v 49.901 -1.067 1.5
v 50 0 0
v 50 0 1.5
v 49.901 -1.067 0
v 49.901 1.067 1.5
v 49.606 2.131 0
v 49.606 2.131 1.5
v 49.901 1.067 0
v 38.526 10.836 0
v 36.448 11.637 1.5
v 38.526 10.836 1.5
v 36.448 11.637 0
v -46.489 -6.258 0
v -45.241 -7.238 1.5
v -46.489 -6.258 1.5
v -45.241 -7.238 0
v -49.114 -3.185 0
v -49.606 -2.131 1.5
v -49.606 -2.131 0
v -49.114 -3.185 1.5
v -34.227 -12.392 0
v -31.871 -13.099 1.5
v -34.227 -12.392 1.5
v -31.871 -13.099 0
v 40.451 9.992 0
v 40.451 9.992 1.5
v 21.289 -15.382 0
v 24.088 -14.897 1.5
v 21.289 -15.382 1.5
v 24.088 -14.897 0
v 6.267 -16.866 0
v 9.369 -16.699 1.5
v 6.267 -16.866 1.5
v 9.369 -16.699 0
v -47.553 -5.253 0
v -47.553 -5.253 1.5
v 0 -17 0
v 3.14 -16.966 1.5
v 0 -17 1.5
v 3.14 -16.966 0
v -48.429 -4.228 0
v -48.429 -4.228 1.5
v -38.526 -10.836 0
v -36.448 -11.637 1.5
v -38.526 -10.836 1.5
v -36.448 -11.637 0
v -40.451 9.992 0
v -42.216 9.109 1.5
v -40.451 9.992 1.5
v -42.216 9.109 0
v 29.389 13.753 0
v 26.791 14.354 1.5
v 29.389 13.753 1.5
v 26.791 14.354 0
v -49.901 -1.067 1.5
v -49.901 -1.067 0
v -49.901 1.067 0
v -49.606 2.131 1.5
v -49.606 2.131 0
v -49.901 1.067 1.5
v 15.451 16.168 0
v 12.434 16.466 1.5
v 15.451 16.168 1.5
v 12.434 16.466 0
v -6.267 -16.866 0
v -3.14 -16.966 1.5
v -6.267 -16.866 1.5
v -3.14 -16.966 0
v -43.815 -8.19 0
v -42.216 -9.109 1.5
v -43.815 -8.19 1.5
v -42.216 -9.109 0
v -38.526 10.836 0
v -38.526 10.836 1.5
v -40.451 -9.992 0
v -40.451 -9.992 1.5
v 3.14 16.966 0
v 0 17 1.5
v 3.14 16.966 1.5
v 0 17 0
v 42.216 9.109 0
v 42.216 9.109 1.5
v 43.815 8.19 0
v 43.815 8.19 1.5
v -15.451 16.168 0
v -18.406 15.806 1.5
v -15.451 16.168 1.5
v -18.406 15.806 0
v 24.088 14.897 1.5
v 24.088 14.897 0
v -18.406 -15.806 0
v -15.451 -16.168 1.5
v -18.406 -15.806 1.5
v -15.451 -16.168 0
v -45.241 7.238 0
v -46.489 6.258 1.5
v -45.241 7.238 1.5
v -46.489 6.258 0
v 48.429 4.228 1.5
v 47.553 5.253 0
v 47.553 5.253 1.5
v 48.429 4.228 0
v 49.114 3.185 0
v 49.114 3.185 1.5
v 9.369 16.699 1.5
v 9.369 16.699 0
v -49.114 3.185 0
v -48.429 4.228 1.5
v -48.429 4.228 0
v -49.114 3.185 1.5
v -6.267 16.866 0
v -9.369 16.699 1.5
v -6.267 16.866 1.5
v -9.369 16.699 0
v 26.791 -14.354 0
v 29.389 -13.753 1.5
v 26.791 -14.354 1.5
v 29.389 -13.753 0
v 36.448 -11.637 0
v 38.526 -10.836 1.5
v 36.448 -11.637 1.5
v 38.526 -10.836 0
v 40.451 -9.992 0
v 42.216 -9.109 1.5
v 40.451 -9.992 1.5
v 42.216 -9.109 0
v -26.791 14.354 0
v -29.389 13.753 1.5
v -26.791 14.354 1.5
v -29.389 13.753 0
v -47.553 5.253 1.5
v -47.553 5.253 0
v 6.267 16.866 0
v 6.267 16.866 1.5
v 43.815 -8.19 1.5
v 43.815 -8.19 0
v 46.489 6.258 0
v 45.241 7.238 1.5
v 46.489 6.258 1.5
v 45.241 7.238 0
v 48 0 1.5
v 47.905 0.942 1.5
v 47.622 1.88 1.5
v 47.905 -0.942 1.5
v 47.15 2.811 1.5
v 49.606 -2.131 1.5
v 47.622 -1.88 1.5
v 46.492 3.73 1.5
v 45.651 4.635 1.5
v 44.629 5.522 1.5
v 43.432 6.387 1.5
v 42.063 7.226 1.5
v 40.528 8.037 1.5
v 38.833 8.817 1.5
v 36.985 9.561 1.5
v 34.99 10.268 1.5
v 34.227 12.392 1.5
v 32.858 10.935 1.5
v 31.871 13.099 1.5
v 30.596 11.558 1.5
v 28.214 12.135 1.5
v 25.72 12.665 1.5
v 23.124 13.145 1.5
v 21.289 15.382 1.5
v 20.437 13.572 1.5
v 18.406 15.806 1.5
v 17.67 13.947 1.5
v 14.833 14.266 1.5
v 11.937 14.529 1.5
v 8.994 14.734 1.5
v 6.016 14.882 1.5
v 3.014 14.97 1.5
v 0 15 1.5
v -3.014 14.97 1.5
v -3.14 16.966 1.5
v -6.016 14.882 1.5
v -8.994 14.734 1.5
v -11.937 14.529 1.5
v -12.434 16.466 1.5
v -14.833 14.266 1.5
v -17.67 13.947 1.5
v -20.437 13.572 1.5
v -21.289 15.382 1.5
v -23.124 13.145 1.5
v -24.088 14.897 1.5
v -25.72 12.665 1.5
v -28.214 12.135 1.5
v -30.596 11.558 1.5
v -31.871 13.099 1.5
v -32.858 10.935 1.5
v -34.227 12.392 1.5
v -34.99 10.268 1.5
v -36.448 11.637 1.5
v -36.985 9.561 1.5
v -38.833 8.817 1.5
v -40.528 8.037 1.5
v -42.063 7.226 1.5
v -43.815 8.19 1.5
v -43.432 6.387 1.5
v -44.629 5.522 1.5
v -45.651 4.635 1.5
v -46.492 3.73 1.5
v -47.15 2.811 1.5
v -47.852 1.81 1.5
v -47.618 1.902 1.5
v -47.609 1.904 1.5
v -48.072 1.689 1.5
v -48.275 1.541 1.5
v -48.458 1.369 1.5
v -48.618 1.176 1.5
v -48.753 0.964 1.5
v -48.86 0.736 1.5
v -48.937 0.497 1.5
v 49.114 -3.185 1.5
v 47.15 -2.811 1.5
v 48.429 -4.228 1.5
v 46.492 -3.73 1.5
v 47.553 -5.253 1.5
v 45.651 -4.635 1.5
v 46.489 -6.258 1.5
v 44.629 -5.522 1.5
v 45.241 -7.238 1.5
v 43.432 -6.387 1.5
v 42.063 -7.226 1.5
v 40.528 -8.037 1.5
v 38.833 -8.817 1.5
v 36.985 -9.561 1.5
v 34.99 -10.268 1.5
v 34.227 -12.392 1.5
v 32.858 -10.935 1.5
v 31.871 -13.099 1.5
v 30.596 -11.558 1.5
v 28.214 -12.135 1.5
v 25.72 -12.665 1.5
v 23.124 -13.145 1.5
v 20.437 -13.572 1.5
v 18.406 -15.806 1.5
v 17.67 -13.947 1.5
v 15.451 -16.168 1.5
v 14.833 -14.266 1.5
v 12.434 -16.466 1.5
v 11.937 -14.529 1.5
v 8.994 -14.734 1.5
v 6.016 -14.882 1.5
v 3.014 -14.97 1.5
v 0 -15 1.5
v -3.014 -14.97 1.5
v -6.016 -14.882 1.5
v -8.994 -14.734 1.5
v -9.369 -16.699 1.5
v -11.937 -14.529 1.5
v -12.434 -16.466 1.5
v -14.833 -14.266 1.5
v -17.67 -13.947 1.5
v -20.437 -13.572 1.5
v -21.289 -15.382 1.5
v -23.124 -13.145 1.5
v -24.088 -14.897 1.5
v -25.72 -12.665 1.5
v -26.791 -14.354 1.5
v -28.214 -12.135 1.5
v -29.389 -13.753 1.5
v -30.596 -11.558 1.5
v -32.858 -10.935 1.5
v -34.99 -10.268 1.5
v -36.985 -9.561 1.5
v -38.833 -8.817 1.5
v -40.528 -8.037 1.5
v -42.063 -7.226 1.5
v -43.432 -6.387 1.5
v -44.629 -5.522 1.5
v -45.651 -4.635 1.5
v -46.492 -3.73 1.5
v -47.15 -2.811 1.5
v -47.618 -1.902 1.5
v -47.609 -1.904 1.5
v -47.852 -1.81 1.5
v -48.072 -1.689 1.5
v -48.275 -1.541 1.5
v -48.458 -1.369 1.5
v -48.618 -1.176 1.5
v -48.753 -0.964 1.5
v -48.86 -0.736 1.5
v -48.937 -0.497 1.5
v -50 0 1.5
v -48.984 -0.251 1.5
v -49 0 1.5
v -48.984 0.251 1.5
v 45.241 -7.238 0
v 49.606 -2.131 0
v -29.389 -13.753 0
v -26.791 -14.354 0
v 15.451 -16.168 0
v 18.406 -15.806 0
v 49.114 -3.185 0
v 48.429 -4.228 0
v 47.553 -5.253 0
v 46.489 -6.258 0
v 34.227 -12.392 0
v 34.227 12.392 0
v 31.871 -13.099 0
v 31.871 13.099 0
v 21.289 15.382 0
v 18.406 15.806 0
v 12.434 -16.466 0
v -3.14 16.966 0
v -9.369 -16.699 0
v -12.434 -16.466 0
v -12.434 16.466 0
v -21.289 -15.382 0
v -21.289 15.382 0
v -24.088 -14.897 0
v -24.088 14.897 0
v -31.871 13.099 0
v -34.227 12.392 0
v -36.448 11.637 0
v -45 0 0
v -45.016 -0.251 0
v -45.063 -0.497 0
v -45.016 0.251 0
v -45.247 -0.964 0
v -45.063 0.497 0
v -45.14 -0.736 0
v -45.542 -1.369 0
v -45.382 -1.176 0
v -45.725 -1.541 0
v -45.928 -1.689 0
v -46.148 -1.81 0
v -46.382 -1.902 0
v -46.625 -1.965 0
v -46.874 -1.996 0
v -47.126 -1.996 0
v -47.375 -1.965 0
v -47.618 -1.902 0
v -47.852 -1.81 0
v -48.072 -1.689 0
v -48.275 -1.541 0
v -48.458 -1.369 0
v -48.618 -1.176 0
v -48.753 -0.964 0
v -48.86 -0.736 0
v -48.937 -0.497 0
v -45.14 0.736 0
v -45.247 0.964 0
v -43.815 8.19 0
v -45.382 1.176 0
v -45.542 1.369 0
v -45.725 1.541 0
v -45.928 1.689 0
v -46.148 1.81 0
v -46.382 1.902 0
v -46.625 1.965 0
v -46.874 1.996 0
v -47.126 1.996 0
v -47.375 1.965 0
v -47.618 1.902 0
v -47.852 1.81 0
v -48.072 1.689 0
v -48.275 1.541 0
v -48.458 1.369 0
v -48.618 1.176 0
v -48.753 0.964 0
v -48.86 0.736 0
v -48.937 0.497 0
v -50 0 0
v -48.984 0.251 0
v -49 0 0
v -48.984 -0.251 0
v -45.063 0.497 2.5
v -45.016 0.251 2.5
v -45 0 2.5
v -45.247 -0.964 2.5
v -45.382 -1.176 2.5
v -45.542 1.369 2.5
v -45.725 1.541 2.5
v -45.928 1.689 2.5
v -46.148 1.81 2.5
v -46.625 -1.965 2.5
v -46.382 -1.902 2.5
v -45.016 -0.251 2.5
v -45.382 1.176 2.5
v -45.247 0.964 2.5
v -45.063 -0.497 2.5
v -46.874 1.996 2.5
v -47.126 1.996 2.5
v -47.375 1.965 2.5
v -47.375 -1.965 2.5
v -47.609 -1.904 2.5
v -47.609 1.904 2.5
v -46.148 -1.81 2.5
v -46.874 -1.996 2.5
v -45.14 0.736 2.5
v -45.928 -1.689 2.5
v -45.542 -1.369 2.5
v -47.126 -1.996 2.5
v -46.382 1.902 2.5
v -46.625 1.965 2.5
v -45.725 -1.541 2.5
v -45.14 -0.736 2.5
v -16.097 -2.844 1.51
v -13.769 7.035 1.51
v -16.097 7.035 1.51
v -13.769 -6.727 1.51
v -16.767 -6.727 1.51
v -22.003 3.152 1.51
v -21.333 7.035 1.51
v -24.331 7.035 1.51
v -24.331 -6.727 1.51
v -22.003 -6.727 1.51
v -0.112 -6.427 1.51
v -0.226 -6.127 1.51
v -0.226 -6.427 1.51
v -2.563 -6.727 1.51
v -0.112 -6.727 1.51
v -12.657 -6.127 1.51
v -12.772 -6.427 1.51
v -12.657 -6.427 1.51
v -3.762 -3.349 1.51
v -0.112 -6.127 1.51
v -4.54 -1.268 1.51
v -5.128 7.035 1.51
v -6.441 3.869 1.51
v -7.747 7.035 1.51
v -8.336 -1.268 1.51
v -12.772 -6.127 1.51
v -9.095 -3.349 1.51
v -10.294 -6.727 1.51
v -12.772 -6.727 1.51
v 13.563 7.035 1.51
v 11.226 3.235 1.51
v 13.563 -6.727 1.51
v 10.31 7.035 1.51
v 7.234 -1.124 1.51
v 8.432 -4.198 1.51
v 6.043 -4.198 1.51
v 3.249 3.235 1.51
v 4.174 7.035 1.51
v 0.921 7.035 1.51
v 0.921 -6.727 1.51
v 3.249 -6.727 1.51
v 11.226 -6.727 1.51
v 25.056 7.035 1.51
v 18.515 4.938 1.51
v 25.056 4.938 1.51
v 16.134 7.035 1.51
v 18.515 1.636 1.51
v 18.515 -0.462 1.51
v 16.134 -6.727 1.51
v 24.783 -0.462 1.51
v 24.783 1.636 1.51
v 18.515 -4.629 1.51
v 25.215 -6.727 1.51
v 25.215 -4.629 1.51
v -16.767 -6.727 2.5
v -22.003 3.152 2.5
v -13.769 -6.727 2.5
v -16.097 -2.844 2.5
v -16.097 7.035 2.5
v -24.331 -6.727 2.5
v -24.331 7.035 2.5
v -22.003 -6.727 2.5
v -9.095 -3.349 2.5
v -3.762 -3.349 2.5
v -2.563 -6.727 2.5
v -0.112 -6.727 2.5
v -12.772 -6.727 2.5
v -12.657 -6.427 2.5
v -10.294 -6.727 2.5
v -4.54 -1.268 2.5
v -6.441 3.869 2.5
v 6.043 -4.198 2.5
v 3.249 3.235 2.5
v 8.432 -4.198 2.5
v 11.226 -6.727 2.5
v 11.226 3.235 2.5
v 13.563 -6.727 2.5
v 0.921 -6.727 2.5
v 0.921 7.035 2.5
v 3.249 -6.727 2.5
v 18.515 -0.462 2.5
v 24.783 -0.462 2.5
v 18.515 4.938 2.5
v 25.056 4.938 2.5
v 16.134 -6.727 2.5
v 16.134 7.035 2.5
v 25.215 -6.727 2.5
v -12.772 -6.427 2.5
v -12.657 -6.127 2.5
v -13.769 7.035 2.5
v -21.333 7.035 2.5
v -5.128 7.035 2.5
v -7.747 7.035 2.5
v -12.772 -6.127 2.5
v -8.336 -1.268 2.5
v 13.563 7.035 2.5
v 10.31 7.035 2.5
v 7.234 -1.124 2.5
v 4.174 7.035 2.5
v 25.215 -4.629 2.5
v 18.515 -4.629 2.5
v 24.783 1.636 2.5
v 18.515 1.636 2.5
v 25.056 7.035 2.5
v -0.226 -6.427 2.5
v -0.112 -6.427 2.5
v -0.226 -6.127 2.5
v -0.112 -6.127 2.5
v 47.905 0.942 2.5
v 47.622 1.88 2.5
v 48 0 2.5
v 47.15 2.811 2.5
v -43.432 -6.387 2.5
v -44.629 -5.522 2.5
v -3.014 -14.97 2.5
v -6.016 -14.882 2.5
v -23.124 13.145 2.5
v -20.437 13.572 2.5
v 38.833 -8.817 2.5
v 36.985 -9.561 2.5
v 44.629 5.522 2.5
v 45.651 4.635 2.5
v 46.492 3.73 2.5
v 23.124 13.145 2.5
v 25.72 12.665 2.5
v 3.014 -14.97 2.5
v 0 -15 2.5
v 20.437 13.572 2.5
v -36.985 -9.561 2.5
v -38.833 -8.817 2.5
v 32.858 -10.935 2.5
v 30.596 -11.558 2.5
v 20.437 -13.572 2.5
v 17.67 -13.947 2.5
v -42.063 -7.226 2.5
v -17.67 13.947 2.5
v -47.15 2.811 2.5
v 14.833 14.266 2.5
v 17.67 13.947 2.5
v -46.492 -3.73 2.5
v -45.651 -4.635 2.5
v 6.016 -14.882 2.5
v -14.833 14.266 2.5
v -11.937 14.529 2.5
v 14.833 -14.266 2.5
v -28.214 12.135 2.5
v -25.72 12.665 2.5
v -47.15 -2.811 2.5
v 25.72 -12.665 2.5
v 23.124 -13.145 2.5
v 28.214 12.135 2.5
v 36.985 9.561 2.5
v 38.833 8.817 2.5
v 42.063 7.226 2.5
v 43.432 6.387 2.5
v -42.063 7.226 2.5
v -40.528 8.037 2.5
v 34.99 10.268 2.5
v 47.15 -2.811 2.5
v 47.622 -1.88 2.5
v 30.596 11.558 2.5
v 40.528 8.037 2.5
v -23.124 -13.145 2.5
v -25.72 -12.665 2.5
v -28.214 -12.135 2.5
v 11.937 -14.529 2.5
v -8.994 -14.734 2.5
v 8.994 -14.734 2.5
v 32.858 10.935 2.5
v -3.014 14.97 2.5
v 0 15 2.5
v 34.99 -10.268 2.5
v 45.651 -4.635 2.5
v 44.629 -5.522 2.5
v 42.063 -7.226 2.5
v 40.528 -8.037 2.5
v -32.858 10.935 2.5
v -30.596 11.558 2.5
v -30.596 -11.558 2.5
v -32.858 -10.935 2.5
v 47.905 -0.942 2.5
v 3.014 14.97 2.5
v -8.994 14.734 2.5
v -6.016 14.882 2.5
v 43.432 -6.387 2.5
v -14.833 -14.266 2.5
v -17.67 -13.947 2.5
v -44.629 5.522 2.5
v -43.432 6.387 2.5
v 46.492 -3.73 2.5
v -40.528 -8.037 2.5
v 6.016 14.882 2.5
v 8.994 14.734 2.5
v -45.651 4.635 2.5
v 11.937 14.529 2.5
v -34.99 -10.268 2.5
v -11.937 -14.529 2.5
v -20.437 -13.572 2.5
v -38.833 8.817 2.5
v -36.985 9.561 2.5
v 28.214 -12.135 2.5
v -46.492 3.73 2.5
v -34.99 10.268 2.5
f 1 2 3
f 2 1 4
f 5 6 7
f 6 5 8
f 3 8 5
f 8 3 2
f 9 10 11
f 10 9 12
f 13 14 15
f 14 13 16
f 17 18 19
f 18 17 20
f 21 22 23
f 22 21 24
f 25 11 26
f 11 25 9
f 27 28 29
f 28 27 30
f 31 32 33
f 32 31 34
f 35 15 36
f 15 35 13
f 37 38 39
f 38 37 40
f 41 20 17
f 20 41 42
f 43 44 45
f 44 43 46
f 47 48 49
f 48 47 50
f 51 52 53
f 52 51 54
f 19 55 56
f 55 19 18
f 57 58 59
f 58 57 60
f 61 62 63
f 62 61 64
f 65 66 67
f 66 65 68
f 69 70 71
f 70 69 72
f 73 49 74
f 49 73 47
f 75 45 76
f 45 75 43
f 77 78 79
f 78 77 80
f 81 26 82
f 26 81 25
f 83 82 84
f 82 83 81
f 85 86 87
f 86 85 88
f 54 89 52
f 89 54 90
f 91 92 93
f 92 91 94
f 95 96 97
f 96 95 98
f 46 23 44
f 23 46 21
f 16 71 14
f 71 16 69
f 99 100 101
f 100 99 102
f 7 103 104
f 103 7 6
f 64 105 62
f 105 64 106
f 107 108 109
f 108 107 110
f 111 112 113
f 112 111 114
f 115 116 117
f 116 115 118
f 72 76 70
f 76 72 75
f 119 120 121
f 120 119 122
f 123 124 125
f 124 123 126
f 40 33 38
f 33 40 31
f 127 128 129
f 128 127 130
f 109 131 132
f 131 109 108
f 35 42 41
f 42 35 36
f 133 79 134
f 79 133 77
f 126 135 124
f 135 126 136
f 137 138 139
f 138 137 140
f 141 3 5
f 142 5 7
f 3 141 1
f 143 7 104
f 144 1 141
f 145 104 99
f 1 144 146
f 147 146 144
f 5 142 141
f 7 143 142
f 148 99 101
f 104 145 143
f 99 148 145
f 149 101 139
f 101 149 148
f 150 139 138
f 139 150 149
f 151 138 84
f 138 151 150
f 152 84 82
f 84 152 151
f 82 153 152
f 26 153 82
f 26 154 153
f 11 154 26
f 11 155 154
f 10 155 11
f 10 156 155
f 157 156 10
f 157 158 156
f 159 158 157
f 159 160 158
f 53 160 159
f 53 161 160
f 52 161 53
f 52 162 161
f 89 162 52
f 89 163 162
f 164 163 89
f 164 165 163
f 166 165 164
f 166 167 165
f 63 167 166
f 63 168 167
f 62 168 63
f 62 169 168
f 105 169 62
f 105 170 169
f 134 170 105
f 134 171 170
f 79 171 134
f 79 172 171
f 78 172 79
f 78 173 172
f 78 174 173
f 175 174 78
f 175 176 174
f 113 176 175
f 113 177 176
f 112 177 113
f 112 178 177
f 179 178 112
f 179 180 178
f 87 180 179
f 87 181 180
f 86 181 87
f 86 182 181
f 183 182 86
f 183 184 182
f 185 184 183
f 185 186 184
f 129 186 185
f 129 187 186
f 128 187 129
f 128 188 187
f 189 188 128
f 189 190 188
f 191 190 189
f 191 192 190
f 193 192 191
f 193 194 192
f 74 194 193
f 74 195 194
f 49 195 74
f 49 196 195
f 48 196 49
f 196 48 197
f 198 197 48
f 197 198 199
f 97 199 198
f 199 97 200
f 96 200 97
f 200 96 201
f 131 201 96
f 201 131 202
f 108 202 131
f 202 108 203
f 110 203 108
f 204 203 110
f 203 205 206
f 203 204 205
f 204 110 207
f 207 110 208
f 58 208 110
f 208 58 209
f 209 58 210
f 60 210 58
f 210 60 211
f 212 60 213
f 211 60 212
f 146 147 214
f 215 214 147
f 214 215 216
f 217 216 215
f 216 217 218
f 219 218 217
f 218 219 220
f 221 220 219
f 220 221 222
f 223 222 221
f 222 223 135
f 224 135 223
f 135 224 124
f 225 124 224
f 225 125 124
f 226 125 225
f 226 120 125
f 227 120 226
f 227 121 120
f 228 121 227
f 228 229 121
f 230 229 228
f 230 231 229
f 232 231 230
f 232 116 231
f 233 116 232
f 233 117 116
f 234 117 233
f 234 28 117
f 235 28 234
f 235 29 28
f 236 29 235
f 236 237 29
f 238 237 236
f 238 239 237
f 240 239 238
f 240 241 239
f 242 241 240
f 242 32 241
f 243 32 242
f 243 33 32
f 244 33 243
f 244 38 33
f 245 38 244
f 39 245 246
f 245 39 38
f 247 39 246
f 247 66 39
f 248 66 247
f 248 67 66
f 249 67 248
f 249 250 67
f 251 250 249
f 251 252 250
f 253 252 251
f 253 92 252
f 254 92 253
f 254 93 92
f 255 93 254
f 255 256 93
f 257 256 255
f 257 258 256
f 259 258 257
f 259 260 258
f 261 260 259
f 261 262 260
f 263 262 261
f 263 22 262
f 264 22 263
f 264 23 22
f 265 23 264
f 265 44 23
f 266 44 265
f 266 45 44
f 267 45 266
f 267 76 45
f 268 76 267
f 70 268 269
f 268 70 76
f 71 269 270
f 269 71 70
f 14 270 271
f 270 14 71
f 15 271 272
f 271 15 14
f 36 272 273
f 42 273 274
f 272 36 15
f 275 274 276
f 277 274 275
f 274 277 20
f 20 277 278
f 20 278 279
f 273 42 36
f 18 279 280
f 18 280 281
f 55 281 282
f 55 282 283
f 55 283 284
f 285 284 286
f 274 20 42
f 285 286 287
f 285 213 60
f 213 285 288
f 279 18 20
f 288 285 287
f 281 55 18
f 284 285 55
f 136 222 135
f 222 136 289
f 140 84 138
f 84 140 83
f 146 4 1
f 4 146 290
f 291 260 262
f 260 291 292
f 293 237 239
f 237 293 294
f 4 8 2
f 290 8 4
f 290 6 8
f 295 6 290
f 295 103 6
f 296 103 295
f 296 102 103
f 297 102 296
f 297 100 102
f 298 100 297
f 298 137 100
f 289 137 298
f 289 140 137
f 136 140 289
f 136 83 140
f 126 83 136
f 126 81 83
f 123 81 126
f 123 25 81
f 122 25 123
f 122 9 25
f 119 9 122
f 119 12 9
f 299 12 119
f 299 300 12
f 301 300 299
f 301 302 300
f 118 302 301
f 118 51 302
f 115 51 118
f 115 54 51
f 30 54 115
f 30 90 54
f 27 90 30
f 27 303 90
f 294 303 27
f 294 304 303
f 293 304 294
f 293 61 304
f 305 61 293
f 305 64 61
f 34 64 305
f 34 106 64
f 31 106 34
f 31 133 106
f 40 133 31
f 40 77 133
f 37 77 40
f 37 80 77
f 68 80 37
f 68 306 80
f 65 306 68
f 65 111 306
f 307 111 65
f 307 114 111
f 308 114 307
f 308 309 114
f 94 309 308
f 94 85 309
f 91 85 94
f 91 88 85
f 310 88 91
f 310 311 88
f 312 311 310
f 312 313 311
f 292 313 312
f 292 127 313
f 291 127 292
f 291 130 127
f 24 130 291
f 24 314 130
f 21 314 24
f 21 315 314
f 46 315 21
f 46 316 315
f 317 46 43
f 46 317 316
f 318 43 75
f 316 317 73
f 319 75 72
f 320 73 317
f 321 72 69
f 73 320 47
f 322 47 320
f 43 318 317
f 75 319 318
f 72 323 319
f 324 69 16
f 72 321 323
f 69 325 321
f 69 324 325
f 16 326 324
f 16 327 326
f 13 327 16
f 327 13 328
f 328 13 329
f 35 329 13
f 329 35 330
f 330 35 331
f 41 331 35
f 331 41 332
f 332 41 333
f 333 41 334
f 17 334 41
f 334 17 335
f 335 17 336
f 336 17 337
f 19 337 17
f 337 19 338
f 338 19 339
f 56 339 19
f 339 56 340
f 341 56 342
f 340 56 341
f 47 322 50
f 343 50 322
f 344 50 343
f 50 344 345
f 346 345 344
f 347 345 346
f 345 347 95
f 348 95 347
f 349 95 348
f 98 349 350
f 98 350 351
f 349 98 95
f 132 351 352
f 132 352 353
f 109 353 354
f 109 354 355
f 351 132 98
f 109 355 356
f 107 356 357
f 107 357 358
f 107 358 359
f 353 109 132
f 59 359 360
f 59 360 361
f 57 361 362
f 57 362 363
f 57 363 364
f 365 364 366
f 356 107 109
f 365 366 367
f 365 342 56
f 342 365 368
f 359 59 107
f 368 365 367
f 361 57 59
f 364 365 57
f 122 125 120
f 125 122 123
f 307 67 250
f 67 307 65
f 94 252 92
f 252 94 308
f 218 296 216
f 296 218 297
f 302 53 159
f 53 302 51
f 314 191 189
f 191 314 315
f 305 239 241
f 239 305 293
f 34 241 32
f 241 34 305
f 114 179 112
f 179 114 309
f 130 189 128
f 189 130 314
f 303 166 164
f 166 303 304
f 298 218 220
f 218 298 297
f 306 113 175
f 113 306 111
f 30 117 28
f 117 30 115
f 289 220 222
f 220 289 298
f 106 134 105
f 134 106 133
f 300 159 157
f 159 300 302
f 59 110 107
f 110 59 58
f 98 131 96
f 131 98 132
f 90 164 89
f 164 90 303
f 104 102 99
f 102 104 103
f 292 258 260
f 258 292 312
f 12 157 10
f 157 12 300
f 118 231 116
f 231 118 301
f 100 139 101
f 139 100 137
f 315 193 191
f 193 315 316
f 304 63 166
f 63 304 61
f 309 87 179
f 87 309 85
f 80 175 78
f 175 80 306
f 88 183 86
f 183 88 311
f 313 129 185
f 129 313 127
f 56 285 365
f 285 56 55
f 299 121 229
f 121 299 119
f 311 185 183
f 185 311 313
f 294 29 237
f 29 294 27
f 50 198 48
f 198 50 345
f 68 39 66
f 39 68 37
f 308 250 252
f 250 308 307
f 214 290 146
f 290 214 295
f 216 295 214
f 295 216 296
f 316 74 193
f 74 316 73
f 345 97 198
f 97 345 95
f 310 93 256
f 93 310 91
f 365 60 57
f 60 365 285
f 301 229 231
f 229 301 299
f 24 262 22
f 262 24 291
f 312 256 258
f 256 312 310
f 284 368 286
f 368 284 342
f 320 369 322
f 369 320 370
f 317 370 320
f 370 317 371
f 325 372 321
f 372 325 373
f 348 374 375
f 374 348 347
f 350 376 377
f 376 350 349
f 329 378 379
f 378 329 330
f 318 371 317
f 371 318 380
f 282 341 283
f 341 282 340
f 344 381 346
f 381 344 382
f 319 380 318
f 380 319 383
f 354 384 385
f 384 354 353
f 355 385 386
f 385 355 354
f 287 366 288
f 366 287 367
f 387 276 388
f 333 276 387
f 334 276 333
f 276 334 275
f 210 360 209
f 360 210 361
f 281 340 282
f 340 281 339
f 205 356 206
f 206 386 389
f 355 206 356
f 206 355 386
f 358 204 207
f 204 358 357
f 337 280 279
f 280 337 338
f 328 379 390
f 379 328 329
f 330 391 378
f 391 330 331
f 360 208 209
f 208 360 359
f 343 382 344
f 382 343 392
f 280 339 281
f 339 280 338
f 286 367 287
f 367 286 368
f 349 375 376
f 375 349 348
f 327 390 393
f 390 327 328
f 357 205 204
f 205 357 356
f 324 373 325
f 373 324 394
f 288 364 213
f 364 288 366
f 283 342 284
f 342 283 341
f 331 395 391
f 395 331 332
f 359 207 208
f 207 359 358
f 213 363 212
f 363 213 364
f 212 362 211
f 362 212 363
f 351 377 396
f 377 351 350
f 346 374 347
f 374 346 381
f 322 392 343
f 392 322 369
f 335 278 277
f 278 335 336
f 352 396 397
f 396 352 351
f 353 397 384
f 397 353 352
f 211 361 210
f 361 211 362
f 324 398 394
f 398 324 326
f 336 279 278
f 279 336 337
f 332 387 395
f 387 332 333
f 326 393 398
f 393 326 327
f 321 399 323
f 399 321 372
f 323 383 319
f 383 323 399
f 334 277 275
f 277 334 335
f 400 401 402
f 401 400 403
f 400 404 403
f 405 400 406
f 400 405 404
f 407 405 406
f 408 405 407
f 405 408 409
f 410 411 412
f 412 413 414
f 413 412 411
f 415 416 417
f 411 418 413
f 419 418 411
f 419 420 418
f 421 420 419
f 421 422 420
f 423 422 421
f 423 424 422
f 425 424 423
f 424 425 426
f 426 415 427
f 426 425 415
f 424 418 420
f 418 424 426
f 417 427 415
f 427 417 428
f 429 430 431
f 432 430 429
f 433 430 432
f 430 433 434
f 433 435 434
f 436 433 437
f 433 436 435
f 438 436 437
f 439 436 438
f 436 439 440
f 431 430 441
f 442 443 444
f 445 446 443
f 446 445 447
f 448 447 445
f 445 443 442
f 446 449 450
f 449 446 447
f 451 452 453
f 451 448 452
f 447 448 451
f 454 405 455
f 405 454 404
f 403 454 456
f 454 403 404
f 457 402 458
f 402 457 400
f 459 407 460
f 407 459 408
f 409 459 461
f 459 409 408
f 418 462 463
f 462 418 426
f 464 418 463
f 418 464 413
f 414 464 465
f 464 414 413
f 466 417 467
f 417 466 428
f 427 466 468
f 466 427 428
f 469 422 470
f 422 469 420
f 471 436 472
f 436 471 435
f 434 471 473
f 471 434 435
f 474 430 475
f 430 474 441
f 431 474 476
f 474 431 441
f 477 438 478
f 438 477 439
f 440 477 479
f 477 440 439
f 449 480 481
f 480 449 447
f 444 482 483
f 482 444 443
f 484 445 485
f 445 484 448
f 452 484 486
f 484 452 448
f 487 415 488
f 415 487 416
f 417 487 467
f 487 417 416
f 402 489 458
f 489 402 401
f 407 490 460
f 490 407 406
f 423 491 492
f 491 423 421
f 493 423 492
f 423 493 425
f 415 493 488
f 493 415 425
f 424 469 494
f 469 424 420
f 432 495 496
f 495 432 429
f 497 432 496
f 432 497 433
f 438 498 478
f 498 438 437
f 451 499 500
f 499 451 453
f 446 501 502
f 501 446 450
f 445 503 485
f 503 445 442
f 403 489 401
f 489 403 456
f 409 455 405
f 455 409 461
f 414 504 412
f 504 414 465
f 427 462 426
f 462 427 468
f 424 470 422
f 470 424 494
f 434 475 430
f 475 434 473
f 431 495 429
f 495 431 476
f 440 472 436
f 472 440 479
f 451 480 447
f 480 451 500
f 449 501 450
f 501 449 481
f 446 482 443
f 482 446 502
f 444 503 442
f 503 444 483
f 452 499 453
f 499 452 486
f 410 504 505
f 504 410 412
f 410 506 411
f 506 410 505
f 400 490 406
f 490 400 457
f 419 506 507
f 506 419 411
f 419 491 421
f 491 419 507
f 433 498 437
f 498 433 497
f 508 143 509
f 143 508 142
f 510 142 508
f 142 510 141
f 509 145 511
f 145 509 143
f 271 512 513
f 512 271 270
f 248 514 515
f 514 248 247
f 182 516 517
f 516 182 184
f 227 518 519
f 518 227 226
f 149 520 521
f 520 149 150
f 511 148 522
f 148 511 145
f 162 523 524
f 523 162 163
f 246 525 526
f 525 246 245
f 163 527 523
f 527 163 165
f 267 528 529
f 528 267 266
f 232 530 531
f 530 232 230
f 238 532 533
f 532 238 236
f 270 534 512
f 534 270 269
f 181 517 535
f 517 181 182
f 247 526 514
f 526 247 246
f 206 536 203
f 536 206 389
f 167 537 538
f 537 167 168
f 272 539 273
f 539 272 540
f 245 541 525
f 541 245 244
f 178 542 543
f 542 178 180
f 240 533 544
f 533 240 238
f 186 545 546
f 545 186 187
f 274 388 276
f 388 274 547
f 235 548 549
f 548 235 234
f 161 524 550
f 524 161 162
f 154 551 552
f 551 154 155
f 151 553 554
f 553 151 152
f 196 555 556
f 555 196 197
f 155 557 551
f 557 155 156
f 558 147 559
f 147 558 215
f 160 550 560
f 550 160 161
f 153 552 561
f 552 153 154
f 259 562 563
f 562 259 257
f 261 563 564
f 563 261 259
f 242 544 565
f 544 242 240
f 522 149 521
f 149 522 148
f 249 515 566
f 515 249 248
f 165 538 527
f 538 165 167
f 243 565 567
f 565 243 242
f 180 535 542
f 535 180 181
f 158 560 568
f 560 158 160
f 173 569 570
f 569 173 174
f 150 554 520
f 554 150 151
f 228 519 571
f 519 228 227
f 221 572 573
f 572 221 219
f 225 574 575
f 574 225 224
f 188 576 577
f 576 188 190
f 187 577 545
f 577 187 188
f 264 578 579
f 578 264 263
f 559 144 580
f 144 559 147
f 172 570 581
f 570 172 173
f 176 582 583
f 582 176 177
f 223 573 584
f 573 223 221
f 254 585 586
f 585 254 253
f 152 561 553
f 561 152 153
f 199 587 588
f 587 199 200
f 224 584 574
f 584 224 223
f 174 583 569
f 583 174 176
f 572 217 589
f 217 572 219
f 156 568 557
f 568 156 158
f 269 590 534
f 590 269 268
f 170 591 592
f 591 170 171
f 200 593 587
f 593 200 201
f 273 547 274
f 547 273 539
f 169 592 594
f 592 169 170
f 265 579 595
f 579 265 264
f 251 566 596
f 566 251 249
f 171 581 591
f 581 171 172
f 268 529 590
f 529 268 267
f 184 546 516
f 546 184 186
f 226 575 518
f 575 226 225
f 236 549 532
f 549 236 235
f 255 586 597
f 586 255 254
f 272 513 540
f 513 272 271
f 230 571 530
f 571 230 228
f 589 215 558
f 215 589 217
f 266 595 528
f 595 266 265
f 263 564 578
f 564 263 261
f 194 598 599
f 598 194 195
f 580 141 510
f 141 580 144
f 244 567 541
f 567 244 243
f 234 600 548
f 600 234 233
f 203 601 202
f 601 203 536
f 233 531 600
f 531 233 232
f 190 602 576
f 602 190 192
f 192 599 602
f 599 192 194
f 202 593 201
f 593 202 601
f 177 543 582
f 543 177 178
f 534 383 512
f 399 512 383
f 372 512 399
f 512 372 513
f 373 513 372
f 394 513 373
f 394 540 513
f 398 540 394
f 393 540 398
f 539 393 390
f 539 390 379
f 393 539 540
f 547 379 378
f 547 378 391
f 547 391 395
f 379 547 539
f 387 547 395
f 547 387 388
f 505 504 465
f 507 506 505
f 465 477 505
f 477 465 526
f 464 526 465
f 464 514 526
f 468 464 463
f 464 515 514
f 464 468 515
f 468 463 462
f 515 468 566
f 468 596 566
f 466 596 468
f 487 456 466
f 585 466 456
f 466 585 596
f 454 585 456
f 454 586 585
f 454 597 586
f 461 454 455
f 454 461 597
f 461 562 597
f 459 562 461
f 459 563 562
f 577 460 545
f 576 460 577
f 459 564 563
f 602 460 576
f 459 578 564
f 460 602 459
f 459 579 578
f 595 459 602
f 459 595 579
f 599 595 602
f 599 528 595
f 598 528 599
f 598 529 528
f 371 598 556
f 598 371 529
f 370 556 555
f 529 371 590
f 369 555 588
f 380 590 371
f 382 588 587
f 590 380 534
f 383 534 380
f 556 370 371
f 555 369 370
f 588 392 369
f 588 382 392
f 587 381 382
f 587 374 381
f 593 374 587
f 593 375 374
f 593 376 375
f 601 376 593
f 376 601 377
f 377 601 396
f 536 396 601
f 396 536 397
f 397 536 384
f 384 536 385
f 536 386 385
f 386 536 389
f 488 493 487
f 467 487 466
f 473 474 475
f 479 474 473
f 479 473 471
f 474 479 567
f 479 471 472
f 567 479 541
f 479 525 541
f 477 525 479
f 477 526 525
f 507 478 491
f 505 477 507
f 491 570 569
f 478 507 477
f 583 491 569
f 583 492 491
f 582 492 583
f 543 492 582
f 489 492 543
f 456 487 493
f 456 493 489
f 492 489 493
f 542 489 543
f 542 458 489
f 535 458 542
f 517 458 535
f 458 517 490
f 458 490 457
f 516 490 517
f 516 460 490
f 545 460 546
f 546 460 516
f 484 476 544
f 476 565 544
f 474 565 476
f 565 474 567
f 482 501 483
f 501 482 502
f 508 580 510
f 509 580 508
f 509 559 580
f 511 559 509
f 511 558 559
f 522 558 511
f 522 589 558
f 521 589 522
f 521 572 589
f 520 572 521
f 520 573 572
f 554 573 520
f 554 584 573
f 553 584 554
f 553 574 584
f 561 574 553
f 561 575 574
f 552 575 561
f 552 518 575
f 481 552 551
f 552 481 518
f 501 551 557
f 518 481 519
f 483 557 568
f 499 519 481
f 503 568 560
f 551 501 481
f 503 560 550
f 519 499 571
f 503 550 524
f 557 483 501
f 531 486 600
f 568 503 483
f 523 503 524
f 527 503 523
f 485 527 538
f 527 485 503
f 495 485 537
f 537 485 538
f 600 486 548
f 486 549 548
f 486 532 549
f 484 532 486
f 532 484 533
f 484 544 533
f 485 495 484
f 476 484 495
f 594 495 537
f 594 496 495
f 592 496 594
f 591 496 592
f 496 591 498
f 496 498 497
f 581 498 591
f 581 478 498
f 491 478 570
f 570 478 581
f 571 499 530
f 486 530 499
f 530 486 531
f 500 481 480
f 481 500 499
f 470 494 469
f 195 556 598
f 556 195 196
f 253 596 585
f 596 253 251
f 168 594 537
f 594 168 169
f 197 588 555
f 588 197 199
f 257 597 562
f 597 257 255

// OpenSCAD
// Two-Layer Oval Zipper Pull Template with Engraved Text
// Creates a white base oval with a blue top oval, engraved text, and a hole for zipper attachment

// Parameters - these can be overridden from command line
name = "NAME"; // Text to display on zipper pull
oval_width = 96; // Width of blue oval (mm) - white base will be 100mm total (96 + 2*2)
oval_height = 30; // Height of blue oval (mm) - white base will be 34mm total (30 + 2*2)
base_thickness = 1.5; // Thickness of white base layer (mm)
top_thickness = 1; // Thickness of blue top layer (mm)
base_offset = 2; // How much larger the white base is (mm)
base_text_size = 13; // Base font size for medium names (reduced to prevent interference with hole)
text_depth = 1; // How deep the text is engraved (mm) - cuts through blue to show white
font_file = "C:/Users/Fred/claude/Fordscript.ttf"; // Path to the custom font file

// Dynamic font sizing based on name length (mimics Ford oval proportions)
// "Fred" (4 chars) at 13mm gives ~20% coverage - our target
name_length = len(name);
text_size = name_length <= 3 ? 18 :      // Short names (Zoe, Sam, Al) - larger
            name_length <= 5 ? 13 :      // Medium names (Fred, John, Mary) - standard
            name_length <= 8 ? 11 :      // Longer names (Michael, Jessica) - smaller
            9;                           // Very long names (Christopher) - smallest

// Hole parameters for zipper pull
hole_diameter = 4; // Diameter of the hole (mm)
hole_clearance = 1; // Minimum clearance from edge of white base layer (mm)

// Module to create an oval (ellipse)
module oval(width, height, depth) {
    scale([width/2, height/2, 1])
        cylinder(h=depth, r=1, $fn=100);
}

// White base layer (larger oval) with hole
module base_layer() {
    color("white")
    difference() {
        oval(
            oval_width + base_offset*2,
            oval_height + base_offset*2,
            base_thickness
        );

        // Hole for zipper pull - positioned relative to white base edge
        // Calculate from white base width: (oval_width + base_offset*2)
        white_width = oval_width + base_offset*2;
        hole_x = -(white_width/2) + (hole_diameter/2) + hole_clearance;
        translate([hole_x, 0, -0.05])
            cylinder(h=base_thickness + 0.1, d=hole_diameter, $fn=50);
    }
}

// Blue top layer with engraved text and hole
module top_layer() {
    color("RoyalBlue")
    difference() {
        // Blue oval
        translate([0, 0, base_thickness])
            oval(oval_width, oval_height, top_thickness);

        // Engraved text (cuts into the blue layer)
        // Multiple offset renders create a "fake bold" effect
        for (x = [-0.3, 0, 0.3]) {
            for (y = [-0.3, 0, 0.3]) {
                translate([x, y, base_thickness + top_thickness - text_depth + 0.01])
                    linear_extrude(height=text_depth)
                        text(name,
                             size=text_size,
                             font="Fordscript",
                             halign="center",
                             valign="center");
            }
        }

        // Hole for zipper pull (positioned on left side)
        // Position: matches white base layer hole position
        white_width = oval_width + base_offset*2;
        hole_x = -(white_width/2) + (hole_diameter/2) + hole_clearance;
        translate([hole_x, 0, base_thickness])
            cylinder(h=top_thickness + 0.1, d=hole_diameter, $fn=50);
    }
}

// Main zipper pull assembly
module zipper_pull() {
    base_layer();
    top_layer();
}

// Generate the zipper pull
zipper_pull();
